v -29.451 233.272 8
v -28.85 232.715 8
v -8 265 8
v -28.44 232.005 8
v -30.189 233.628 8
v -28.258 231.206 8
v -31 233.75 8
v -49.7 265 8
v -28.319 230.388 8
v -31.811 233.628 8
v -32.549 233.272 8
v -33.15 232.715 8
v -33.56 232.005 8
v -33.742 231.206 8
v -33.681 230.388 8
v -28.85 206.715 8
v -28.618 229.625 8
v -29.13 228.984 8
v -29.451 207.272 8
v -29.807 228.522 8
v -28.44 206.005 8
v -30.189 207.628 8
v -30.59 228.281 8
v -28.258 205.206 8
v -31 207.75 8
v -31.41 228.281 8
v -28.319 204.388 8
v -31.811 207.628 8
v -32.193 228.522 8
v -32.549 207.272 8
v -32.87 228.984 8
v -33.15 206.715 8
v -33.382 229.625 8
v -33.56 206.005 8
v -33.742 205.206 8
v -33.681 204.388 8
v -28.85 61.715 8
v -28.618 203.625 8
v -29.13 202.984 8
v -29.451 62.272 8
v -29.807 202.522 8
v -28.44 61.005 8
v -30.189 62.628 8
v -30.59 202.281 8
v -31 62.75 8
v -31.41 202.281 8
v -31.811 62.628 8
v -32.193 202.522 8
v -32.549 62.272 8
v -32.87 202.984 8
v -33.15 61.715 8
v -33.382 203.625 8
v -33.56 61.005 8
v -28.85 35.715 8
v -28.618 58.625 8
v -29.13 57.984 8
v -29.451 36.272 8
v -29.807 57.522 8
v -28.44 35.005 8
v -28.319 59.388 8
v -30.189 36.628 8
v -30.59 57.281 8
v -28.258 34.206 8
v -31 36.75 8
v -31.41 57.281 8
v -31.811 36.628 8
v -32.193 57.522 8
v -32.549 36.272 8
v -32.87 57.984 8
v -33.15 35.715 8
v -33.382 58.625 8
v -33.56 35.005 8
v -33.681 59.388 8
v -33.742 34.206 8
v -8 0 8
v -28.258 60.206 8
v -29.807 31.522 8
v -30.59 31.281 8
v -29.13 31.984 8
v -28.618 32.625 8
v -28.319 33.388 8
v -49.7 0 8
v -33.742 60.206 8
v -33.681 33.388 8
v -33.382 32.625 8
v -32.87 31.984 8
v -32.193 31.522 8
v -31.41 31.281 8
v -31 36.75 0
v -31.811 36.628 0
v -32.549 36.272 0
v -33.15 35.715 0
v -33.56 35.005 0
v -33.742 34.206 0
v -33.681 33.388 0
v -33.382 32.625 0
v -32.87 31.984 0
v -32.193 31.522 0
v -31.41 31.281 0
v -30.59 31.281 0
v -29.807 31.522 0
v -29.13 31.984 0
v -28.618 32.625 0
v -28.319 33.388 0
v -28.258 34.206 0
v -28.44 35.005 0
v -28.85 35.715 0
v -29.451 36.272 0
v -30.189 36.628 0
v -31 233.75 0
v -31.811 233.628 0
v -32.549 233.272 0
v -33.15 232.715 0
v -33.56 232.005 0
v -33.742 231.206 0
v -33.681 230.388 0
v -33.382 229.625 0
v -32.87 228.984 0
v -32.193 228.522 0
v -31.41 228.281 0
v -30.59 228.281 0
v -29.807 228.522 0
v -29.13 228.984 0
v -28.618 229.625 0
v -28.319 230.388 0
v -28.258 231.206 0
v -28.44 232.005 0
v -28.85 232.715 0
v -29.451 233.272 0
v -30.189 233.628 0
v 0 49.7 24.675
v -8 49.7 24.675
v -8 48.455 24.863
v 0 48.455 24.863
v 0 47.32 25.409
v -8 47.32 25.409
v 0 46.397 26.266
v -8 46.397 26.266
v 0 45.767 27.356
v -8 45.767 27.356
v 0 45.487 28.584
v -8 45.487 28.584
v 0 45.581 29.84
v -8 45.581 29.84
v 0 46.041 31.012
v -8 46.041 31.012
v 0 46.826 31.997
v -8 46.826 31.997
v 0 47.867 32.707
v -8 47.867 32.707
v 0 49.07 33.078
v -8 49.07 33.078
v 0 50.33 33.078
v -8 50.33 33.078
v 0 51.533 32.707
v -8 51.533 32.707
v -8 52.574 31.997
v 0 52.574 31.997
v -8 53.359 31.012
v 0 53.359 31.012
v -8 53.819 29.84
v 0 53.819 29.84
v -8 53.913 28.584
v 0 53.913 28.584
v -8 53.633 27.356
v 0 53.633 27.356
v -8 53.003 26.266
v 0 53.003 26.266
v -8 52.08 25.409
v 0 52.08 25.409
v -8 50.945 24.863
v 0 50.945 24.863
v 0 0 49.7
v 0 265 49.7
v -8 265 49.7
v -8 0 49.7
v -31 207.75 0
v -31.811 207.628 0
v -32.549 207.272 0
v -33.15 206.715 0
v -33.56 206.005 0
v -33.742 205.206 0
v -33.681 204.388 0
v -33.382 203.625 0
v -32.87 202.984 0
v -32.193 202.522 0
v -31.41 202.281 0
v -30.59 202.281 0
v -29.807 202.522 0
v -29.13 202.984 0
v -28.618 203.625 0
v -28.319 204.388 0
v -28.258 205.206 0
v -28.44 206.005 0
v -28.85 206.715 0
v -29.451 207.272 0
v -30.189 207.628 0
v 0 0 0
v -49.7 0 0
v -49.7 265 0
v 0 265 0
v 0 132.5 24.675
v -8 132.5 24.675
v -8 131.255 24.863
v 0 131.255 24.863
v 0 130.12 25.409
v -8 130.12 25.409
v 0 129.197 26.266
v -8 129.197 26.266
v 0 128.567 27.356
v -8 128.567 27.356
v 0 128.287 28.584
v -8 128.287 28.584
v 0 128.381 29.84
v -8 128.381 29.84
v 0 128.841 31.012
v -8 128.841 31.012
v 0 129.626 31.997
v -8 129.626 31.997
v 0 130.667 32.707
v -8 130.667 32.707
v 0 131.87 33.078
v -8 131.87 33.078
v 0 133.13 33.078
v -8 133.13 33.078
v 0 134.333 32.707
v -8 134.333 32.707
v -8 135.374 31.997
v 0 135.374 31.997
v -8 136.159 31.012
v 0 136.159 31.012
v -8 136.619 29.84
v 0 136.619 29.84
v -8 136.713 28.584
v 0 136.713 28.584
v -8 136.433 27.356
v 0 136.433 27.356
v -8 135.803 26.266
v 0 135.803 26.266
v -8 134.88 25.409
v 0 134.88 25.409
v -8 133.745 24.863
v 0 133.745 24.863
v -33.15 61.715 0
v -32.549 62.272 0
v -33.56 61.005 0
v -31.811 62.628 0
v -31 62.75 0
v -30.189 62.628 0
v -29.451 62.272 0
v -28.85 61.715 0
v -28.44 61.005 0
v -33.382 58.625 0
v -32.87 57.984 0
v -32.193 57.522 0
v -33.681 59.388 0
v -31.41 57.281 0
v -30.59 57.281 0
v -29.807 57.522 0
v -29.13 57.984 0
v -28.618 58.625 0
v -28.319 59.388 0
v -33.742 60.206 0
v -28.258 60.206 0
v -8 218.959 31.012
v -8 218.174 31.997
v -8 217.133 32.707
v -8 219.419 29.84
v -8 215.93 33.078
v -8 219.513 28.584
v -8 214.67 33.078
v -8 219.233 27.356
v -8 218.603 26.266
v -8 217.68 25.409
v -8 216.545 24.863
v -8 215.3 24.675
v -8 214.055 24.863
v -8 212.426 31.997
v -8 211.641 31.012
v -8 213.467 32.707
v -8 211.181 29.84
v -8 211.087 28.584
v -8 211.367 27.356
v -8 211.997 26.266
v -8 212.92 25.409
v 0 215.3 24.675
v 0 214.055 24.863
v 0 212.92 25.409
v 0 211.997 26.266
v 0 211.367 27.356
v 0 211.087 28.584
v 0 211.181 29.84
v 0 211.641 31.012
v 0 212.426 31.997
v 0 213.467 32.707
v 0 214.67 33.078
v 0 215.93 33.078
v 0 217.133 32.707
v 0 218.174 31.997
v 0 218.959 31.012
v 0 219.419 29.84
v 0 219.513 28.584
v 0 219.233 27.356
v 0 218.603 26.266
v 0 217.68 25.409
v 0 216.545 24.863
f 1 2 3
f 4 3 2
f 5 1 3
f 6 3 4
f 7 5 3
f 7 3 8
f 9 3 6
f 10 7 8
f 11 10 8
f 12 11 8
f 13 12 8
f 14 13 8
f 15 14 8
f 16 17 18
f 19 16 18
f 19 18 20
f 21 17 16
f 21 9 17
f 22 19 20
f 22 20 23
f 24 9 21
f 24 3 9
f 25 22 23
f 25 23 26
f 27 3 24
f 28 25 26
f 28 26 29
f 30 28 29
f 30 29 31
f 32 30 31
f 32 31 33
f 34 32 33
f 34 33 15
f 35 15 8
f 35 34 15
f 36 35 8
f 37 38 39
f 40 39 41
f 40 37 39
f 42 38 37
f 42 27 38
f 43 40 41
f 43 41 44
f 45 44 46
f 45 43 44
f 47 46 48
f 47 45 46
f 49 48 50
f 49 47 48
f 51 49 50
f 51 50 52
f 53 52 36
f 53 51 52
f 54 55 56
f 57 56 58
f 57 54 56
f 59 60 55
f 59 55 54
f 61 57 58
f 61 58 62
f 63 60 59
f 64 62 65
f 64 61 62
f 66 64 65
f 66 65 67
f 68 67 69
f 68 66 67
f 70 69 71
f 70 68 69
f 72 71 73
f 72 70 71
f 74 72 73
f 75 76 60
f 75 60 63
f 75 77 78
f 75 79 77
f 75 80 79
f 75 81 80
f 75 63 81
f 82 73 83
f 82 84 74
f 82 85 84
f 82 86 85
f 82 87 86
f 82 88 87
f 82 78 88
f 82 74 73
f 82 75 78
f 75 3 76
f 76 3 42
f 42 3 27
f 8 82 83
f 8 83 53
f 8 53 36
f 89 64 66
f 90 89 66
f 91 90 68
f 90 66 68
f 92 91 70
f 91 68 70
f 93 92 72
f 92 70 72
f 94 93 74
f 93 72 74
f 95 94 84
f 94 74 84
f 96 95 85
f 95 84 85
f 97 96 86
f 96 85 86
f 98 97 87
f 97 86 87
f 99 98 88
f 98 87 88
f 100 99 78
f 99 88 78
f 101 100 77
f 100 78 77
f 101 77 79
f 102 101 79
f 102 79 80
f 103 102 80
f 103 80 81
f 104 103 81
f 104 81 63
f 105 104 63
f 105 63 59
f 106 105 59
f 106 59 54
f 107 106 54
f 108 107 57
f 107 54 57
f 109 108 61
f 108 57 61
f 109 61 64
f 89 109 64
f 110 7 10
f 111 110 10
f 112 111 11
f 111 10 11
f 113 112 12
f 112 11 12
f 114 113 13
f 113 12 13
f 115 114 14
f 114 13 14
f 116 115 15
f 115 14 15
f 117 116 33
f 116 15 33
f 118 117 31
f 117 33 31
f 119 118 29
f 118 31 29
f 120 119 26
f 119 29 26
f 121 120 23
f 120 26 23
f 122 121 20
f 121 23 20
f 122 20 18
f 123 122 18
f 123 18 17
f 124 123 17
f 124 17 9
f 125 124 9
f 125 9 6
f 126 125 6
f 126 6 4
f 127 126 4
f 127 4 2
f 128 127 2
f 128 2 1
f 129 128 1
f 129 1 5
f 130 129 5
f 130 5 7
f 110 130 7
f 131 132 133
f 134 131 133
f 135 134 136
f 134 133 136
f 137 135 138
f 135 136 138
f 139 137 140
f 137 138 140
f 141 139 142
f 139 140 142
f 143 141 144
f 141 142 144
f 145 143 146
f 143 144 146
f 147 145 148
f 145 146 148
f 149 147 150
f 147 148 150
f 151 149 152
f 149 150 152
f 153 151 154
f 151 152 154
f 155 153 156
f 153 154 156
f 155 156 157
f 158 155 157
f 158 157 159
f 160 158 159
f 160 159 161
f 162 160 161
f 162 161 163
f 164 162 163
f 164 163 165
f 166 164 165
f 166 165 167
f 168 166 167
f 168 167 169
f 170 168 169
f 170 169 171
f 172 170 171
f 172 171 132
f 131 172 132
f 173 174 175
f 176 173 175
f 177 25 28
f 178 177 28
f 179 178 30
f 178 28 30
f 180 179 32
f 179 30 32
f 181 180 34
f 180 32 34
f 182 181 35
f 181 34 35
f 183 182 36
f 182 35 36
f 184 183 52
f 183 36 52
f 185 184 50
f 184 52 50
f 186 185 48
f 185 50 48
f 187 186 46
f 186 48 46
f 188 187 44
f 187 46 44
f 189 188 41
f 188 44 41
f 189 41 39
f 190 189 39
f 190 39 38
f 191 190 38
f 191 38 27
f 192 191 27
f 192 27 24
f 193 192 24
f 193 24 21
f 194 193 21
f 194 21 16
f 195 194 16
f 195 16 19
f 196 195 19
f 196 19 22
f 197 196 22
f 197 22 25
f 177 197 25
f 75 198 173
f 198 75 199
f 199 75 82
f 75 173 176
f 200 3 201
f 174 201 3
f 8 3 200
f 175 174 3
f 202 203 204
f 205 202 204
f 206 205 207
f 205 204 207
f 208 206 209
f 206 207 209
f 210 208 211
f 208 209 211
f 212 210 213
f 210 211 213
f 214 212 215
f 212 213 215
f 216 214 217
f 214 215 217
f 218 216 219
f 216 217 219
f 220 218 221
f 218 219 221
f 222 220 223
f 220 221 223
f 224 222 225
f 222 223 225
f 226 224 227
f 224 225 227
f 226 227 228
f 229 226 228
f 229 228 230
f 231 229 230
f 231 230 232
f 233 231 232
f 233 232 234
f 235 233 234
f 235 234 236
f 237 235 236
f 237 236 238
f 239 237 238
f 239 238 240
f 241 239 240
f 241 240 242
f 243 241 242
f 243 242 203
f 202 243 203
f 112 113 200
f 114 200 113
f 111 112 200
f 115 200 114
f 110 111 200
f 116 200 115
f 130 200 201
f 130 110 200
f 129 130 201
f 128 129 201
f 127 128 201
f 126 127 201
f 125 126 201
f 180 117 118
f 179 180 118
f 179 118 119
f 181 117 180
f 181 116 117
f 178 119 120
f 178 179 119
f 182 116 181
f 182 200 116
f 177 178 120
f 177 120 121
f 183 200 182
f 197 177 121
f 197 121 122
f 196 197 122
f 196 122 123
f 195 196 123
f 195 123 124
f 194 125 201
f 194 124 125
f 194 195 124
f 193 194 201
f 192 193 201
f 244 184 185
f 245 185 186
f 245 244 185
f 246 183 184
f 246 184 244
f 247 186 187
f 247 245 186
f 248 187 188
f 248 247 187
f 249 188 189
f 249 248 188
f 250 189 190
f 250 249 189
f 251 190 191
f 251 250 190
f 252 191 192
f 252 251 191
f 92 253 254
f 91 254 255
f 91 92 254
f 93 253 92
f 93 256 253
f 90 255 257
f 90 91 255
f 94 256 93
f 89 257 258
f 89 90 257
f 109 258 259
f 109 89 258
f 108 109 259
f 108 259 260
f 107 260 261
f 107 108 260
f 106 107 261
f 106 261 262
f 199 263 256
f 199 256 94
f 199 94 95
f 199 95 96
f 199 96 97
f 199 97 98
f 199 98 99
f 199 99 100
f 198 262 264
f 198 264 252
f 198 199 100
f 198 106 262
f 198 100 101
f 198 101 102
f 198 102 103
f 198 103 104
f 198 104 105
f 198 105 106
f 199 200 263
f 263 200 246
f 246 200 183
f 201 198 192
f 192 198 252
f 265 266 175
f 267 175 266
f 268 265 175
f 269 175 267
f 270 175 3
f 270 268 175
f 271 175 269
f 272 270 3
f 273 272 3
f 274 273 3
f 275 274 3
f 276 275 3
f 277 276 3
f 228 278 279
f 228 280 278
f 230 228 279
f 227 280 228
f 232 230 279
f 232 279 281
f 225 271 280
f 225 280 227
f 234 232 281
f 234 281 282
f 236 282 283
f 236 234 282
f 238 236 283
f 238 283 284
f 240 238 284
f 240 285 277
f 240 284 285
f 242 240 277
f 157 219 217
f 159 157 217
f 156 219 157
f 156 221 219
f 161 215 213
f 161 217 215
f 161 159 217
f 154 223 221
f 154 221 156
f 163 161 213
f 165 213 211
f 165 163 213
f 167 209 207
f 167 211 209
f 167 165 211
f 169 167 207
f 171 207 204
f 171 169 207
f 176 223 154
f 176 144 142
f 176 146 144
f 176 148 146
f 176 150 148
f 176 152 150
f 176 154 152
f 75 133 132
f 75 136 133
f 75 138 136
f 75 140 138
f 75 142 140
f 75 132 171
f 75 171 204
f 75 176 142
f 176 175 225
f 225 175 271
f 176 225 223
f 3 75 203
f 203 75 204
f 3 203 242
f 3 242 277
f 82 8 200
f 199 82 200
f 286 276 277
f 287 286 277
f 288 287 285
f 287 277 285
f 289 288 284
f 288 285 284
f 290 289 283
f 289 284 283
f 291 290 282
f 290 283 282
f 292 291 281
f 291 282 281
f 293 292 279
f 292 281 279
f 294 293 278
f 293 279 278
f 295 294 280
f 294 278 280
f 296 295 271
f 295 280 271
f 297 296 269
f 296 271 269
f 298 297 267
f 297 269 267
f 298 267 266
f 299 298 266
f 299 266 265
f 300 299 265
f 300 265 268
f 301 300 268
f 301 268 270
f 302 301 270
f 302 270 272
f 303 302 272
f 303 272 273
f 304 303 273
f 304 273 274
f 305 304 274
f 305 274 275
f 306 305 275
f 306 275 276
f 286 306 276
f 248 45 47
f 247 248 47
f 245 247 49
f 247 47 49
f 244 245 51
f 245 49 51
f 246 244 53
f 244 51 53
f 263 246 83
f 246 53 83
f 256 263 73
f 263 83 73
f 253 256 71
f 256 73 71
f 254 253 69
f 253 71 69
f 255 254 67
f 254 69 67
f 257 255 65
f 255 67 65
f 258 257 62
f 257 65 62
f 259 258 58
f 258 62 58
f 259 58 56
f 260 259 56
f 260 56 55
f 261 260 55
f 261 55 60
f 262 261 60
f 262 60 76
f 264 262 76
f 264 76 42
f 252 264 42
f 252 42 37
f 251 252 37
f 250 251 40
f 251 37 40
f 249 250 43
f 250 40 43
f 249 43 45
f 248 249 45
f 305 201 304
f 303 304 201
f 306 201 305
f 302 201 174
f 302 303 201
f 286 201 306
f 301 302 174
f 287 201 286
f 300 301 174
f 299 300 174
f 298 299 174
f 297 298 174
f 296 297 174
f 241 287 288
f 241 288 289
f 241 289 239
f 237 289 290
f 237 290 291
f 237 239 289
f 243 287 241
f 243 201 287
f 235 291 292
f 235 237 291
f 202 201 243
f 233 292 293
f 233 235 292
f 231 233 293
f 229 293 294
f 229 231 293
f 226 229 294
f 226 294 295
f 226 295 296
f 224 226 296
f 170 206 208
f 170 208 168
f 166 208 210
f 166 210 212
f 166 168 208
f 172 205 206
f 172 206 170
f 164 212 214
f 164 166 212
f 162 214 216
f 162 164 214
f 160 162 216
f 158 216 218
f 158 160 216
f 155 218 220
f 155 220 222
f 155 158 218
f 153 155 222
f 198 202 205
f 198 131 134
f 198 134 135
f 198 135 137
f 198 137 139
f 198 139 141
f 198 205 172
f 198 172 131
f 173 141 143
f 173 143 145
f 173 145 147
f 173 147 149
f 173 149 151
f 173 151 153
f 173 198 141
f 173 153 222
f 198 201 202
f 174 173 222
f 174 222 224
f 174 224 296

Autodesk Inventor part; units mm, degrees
ref_plane "YZ Plane" through (0, 0, 0) normal (1, 0, 0) x (0, 1, 0)
ref_plane "XZ Plane" through (0, 0, 0) normal (0, 1, 0) x (-1, 0, 0)
ref_plane "XY Plane" through (0, 0, 0) normal (0, 0, 1) x (1, 0, 0)
sketch "Sketch1" plane through (0, 0, 0) normal (0, 1, 0) x (-1, 0, 0)
  line L0 (0, 0) -> (0, 49.7)
  line L1 (0, 49.7) -> (8, 49.7)
  line L2 (8, 49.7) -> (8, 8)
  line L3 (8, 8) -> (49.7, 8)
  line L4 (49.7, 8) -> (49.7, 0)
  line L5 (49.7, 0) -> (0, 0)
  dimension "d0" = 49.7
  dimension "d1" = 8
extrude "Extrusion1" add sketch "Sketch1" along normal blind 265
sketch "Sketch2" plane through (0, 0, 0) normal (0, 0, -1) x (-1, 0, 0)
  line L0 (49.7, 0) -> (0, 0) construction
  line L1 (49.7, 0) -> (49.7, 265) construction
  line L2 (0, 265) -> (49.7, 265) construction
  line L3 (0, 0) -> (0, 265) construction
  line L4 (31, 0) -> (31, 265) construction
  line L5 (0, 265) -> (49.7, 265) construction
  point P0 (31, 231)
  point P1 (31, 205)
  point P2 (31, 60)
  point P3 (31, 34)
  dimension "d4" = 26
  dimension "d5" = 26
  dimension "d6" = 34
  dimension "d7" = 34
  dimension "d8" = 31
hole "Hole1" at (-31, 231, 0) at (-31, 205, 0) at (-31, 60, 0) at (-31, 34, 0) direction (0, 0, 1) diameter 5.5 depth 8 tip angle 118 clearance for "Hex Head Bolt" size "M5" standard "Ansi Metric M Profile"
sketch "Sketch3" plane through (0, 0, 49.7) normal (1, 0, 0) x (0, 0, -1)
  line L0 (49.7, 0) -> (0, 0) construction
  line L1 (49.7, 0) -> (49.7, 265) construction
  line L2 (0, 265) -> (49.7, 265) construction
  line L3 (0, 0) -> (0, 265) construction
  line L4 (0, 0) -> (41.7, 0) construction
  line L5 (20.8, 0) -> (20.8, 265) construction
  point P0 (20.8, 132.5)
  point P1 (20.8, 215.3)
  point P2 (20.8, 49.7)
  dimension "d16" = 20.8
  dimension "Mounting_Hole_Spacing" = 82.8
  dimension "d18" = 82.8
hole "Hole2" at (0, 132.5, 28.9) at (0, 215.3, 28.9) at (0, 49.7, 28.9) direction (-1, 0, 0) diameter 8.45 end through all
equation "\"d4\" = Mount_Hole_Spacing"
equation "\"d5\" = Mount_Hole_Spacing"
equation "\"d7\" = d6"
equation "\"d18\" = Mounting_Hole_Spacing"
equation "\"Mount_Hole_Spacing\" = 26"
properties part number "Horn_Bracket" material "Steel, Cast"
